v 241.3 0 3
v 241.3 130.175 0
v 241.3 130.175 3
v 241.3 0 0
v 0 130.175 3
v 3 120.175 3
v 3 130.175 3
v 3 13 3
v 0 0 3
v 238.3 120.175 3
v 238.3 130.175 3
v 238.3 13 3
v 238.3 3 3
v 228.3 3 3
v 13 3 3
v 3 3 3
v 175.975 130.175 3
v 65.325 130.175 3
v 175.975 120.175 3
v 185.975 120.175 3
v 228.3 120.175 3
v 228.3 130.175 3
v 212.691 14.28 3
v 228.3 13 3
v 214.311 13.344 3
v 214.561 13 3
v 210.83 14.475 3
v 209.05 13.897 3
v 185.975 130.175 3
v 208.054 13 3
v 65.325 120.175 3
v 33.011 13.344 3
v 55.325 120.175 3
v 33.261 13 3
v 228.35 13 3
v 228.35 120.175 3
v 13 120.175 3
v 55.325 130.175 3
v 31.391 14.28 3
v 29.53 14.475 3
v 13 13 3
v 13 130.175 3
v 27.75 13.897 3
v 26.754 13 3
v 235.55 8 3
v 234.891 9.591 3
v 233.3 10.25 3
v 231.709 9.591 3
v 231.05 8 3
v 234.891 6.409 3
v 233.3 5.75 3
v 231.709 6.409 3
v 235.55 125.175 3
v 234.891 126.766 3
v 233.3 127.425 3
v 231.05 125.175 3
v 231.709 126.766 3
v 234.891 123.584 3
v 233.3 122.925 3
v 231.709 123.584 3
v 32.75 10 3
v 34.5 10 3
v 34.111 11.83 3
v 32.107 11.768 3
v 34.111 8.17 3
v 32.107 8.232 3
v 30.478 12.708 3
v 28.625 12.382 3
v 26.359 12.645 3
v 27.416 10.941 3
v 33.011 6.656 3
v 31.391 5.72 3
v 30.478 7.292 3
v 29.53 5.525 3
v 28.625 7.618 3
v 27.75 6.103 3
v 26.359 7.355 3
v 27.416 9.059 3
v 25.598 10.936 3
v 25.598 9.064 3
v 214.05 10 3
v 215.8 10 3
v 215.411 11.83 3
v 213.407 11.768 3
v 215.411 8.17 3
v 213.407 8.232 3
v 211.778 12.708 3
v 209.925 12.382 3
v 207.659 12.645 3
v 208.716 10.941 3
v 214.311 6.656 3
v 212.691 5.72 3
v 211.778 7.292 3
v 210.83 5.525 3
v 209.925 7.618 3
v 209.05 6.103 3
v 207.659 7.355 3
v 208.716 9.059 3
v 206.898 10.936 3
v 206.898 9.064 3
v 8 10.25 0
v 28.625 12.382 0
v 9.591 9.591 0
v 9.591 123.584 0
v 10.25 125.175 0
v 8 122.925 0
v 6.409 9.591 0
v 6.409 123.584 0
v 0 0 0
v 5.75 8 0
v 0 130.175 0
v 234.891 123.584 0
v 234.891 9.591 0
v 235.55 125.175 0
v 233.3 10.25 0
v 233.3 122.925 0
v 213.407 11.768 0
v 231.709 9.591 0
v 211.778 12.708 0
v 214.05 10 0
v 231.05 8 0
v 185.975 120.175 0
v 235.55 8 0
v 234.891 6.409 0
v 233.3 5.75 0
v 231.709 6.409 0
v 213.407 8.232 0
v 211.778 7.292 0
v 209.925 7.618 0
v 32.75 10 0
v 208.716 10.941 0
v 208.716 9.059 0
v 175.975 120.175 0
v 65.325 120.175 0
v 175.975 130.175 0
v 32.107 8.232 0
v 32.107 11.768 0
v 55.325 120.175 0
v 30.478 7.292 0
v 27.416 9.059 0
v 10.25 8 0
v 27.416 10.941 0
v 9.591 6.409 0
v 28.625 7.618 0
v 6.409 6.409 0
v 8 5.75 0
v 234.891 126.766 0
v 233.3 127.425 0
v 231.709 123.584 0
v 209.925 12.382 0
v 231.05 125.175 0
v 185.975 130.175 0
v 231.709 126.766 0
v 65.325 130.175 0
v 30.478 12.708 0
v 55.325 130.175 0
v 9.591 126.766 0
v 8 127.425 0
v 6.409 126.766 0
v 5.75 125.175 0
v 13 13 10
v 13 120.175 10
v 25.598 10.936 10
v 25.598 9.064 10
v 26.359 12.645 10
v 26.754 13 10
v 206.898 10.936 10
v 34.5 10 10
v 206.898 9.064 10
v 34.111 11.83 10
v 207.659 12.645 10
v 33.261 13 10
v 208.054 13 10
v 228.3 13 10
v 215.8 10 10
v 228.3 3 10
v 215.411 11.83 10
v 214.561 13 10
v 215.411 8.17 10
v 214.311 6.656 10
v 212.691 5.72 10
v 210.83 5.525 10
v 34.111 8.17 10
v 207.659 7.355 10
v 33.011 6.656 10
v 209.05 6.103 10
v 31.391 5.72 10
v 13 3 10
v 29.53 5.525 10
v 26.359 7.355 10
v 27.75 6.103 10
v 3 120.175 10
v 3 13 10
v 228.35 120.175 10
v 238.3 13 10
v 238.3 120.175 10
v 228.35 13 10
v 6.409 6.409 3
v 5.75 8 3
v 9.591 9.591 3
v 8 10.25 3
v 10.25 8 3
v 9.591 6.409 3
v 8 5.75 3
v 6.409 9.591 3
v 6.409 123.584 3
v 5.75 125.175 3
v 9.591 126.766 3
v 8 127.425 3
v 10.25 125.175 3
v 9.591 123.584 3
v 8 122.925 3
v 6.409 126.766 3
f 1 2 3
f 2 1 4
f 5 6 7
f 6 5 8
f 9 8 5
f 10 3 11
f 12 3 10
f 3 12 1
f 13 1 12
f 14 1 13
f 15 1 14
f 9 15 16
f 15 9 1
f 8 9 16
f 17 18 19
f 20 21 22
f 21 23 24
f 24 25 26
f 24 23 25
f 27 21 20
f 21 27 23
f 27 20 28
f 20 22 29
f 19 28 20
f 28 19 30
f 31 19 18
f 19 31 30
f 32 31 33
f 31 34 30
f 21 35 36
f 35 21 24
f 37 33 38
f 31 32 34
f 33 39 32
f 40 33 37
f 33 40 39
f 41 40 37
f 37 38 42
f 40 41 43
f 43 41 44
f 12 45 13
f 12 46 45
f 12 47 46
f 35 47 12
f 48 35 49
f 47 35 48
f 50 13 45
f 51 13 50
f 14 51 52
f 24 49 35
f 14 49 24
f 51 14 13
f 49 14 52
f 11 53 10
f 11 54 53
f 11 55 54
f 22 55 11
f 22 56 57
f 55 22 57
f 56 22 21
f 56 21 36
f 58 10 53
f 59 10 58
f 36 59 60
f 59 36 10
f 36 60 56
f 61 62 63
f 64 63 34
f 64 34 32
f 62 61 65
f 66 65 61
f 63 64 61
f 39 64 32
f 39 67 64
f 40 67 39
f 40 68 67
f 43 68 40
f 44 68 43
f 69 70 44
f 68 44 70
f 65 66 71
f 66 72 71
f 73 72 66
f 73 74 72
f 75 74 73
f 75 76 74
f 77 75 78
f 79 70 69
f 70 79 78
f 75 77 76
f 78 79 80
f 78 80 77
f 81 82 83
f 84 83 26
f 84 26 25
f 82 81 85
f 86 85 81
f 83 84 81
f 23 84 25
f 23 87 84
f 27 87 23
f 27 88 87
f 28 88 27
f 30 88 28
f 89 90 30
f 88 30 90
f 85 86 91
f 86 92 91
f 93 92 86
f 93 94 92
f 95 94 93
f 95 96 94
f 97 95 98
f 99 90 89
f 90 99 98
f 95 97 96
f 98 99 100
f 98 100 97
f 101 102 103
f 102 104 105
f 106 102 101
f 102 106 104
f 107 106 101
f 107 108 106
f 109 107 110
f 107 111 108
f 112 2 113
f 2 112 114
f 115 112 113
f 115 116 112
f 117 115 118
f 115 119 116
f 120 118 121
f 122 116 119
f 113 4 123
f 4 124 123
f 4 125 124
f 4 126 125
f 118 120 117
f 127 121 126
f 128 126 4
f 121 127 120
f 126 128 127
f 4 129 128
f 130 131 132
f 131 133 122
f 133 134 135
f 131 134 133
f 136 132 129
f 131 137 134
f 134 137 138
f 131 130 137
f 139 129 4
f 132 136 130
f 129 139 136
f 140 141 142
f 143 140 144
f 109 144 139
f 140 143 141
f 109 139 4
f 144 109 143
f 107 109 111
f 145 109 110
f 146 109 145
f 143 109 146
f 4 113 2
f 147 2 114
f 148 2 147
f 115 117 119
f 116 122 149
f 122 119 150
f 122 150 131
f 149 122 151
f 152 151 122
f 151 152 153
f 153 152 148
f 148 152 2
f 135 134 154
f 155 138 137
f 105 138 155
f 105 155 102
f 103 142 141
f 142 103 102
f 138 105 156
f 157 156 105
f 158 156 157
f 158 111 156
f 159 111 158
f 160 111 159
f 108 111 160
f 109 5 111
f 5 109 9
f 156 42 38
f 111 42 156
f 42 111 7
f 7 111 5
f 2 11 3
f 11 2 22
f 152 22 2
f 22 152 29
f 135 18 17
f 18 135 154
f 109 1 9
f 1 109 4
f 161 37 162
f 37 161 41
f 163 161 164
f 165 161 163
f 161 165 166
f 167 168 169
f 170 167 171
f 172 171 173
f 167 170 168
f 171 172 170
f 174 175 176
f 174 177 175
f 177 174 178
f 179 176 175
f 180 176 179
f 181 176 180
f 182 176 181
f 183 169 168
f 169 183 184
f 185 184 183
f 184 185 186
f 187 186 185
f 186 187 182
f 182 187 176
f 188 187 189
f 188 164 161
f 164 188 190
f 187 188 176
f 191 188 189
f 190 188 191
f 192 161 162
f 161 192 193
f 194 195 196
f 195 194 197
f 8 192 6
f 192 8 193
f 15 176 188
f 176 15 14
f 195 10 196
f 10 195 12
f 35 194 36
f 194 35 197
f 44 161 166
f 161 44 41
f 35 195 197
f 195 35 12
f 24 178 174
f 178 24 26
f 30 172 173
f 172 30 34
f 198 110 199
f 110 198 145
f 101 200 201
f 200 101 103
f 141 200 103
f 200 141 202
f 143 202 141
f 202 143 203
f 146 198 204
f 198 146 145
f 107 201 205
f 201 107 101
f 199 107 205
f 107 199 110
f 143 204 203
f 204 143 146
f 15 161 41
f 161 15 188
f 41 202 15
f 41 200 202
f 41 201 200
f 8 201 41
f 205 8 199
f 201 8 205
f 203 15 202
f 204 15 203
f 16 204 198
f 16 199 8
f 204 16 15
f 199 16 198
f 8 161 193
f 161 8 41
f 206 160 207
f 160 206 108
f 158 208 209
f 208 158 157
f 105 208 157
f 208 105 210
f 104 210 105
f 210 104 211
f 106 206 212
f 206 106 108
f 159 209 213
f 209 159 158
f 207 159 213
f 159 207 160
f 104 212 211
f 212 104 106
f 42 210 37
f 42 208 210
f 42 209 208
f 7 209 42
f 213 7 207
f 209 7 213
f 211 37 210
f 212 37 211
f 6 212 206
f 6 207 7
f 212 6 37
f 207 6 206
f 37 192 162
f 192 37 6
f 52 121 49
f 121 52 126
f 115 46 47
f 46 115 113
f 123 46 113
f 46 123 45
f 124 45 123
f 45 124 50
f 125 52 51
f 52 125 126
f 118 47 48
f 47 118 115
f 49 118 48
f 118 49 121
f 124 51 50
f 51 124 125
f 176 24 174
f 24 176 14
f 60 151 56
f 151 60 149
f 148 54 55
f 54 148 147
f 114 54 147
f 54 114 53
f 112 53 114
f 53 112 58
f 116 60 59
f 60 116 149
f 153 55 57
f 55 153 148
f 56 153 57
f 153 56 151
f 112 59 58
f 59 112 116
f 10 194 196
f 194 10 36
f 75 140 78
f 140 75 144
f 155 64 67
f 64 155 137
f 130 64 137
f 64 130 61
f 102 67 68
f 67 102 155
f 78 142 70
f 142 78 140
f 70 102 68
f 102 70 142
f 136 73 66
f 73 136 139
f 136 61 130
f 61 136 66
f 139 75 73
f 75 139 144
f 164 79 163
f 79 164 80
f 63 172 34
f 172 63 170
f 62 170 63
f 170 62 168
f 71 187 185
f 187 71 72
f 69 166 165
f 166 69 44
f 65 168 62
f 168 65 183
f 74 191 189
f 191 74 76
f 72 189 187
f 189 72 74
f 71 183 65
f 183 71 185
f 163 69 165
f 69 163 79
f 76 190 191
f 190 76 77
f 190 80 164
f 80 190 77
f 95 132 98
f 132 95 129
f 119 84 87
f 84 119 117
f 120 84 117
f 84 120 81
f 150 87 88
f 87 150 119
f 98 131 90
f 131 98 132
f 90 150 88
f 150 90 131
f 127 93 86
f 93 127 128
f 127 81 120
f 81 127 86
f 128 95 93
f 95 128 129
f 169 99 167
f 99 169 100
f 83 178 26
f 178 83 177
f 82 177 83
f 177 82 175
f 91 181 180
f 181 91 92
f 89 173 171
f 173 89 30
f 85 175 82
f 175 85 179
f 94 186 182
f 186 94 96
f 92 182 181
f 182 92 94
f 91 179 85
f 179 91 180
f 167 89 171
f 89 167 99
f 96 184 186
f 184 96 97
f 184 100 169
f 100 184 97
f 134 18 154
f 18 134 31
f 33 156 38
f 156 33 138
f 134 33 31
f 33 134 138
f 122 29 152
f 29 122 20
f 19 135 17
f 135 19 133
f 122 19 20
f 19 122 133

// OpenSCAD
// file: CircuitHolder.scad
//$fn=500;

$yOffset=77.5;
$xOffset=75.5;

function getCircuitHolderX() = $xOffset;
function getCircuitHolderY() = $yOffset;

module circuitHole()
{
	difference()
	{
		cylinder(d=8,h=10);
		circuitHoleCenter();
	}
}

module circuitHoleCenter()
{
	translate([0,0,-1]) cylinder(d=5.25,h=11);
}

module circuitHolder()
{
	circuitHole();
	translate([$xOffset,0,0]) circuitHole();
	translate([$xOffset,$yOffset,0]) circuitHole();
	translate([0,$yOffset,0]) circuitHole();
}

module circuitHolderHoles()
{
	circuitHoleCenter();
	translate([$xOffset,0,0]) circuitHoleCenter();
	translate([$xOffset,$yOffset,0]) circuitHoleCenter();
	translate([0,$yOffset,0]) circuitHoleCenter();
}

/*difference()
{
	cube([95,95,0.5]);
	translate([5,5,0]) circuitHolderHoles();
}*/
//translate([5,5,0]) circuitHolder();
// file: PowerHoles.scad
$powerHoleX=151;
$powerHoleY=25;

module powerScrewHole()
{
	translate([0,0,-1]) cylinder(d=4.5,h=10);
}

function getPowerHoleX() = $powerHoleX;
function getPowerHoleY() = $powerHoleY;

module powerHoles()
{
	powerScrewHole();
	translate([0,$powerHoleY,0]) powerScrewHole();
	translate([$powerHoleX,0,0]) powerScrewHole();
	translate([$powerHoleX,$powerHoleY,0]) powerScrewHole();
}

powerHoles();
// file: Bottom.scad
use <PowerHoles.scad>;
use <CircuitHolder.scad>;

$bottomX=241.3;
$bottomY=260.35;
$bottomZ=5;
$wallThickness=3;
$pillerThickness=10;
$connectorLength=20;
$connectorWidth=10;
$holeSize=3.9;
$throughHoleSize=4.5;
$wallHeight=116;


function getWallThickness() = $wallThickness;
function getHoleSize() = $holeSize;
function getWallHeight() = $wallHeight;
function getPillerThickness() = $pillerThickness;
function getBottomX() = $bottomX;
function getBottomY() = $bottomY;
function getBottomZ() = $bottomZ;
function getConnectorLength() = $connectorLength;
function getConnectorWidth() = $connectorWidth;
function getThroughHoleSize() = $throughHoleSize;

module boltHole()
{
	union()
	{
		cylinder(d=$throughHoleSize,h=20);
		translate([0,0,$pillerThickness]) cube([$pillerThickness,$pillerThickness,$pillerThickness], center=true);
	}
}

// Bottom cube
module bottomFront(bottomZ=$bottomZ)
{
	union()
	{
		difference()
		{
			cube([$bottomX,$bottomY/2,bottomZ]);
			translate([($pillerThickness/2)+$wallThickness,($pillerThickness/2)+$wallThickness,0]) boltHole();
			translate([($pillerThickness/2)+$wallThickness,($bottomY/2)-($pillerThickness/2),0]) boltHole();
			translate([$bottomX-(($pillerThickness/2)+$wallThickness),($pillerThickness/2)+$wallThickness,0]) boltHole();
			translate([$bottomX-($pillerThickness/2)-$wallThickness,($bottomY/2)-($pillerThickness/2),0]) boltHole();
			translate([($bottomX/2) + (getPowerHoleX()/2*-1),(($bottomY/2)*0.25)+20,0]) powerHoles();
		}
		translate([($bottomX*0.25)-($connectorWidth/2),($bottomY/2)-($connectorLength/2),0]) cube([$connectorWidth, $connectorLength,bottomZ]);
		translate([($bottomX*0.75)-($connectorWidth/2),($bottomY/2)-($connectorLength/2),0]) cube([$connectorWidth, $connectorLength,bottomZ]);
	}
}

module bottomBack(bottomZ=$bottomZ)
{
	union()
	{
		difference()
		{
			cube([$bottomX,$bottomY/2,bottomZ]);
			translate([($pillerThickness/2)+$wallThickness,($pillerThickness/2)+$wallThickness,0]) #boltHole();
			translate([($pillerThickness/2)+$wallThickness,($bottomY/2)-($pillerThickness/2),0]) #boltHole();
			translate([$bottomX-(($pillerThickness/2)+$wallThickness),($pillerThickness/2)+$wallThickness,0]) #boltHole();
			translate([$bottomX-($pillerThickness/2)-$wallThickness,($bottomY/2)-($pillerThickness/2),0]) #boltHole();
			translate([($bottomX*0.25)-($connectorWidth/2),($bottomY/2)-($connectorLength/2),0]) #cube([$connectorWidth, $connectorLength,bottomZ]);
			translate([($bottomX*0.75)-($connectorWidth/2),($bottomY/2)-($connectorLength/2),0]) #cube([$connectorWidth, $connectorLength,bottomZ]);
			translate([($bottomX*0.5) + (getCircuitHolderX()/2*-1),($bottomY*0.25) + (getCircuitHolderY()/2*-1),0]) #circuitHolderHoles();
		}
		translate([($bottomX*0.5) + (getCircuitHolderX()/2*-1),($bottomY*0.25) + (getCircuitHolderY()/2*-1),0]) #circuitHolder();
	}
}


bottomBack();
// main file
use <Bottom.scad>;

//$fn=500;

module topAttachHole(bottomZ)
{
	translate([0,0,-1]) #cylinder(d=5.5,h=bottomZ*3);
	translate([0,0,bottomZ]) #cylinder(d=9,h=bottomZ*3);
}

module topBase(bottomZ)
{
	cube([getBottomX(),getBottomY()/2,bottomZ]);
	translate([getWallThickness(),getWallThickness(),0]) cube([getPillerThickness(),(getBottomY()/2)-getWallThickness(),getPillerThickness()]);
	translate([getBottomX()-getPillerThickness()-getWallThickness()+0.05,getWallThickness(),0]) cube([getPillerThickness()-0.05,(getBottomY()/2)-getWallThickness(),getPillerThickness()]);
	translate([getWallThickness(),getWallThickness(),0]) cube([getBottomX()-(getWallThickness()*2),getPillerThickness(),getPillerThickness()]);
}

module topBoltHole(bottomZ)
{
	translate([0,0,(bottomZ-1)*-1]) boltHole();
}


module topFront(bottomZ=getBottomZ())
{
	difference()
	{
		topBase(bottomZ);
		translate([(getPillerThickness()/2)+getWallThickness(),(getPillerThickness()/2)+getWallThickness(),0]) #topBoltHole(bottomZ);
		translate([(getPillerThickness()/2)+getWallThickness(),(getBottomY()/2)-(getPillerThickness()/2),0]) #topBoltHole(bottomZ);
		translate([getBottomX()-((getPillerThickness()/2)+getWallThickness()),(getPillerThickness()/2)+getWallThickness(),0]) #topBoltHole(bottomZ);
		translate([getBottomX()-(getPillerThickness()/2)-getWallThickness(),(getBottomY()/2)-(getPillerThickness()/2),0]) #topBoltHole(bottomZ);
		translate([30,10,0]) topAttachHole(bottomZ);
		translate([getBottomX()-30,10,0]) topAttachHole(bottomZ);
	}
	translate([(getBottomX()*0.25)-(getConnectorWidth()/2),(getBottomY()/2)-(getConnectorLength()/2),0]) #cube([getConnectorWidth(), getConnectorLength(),bottomZ]);
	translate([(getBottomX()*0.75)-(getConnectorWidth()/2),(getBottomY()/2)-(getConnectorLength()/2),0]) #cube([getConnectorWidth(), getConnectorLength(),bottomZ]);
}

module topBack(bottomZ=getBottomZ())
{
	difference()
	{
		topBase(bottomZ);
		translate([(getPillerThickness()/2)+getWallThickness(),(getPillerThickness()/2)+getWallThickness(),0]) #topBoltHole(bottomZ);
		translate([(getPillerThickness()/2)+getWallThickness(),(getBottomY()/2)-(getPillerThickness()/2),0]) #topBoltHole(bottomZ);
		translate([getBottomX()-((getPillerThickness()/2)+getWallThickness()),(getPillerThickness()/2)+getWallThickness(),0]) #topBoltHole(bottomZ);
		translate([getBottomX()-(getPillerThickness()/2)-getWallThickness(),(getBottomY()/2)-(getPillerThickness()/2),0]) #topBoltHole(bottomZ);
		translate([30,10,0]) topAttachHole(bottomZ);
		translate([getBottomX()-30,10,0]) topAttachHole(bottomZ);
		translate([(getBottomX()*0.25)-(getConnectorWidth()/2),(getBottomY()/2)-(getConnectorLength()/2),0]) #cube([getConnectorWidth(), getConnectorLength(),bottomZ]);
		translate([(getBottomX()*0.75)-(getConnectorWidth()/2),(getBottomY()/2)-(getConnectorLength()/2),0]) #cube([getConnectorWidth(), getConnectorLength(),bottomZ]);
	}
}

topBack(3);
//topFront(3);
